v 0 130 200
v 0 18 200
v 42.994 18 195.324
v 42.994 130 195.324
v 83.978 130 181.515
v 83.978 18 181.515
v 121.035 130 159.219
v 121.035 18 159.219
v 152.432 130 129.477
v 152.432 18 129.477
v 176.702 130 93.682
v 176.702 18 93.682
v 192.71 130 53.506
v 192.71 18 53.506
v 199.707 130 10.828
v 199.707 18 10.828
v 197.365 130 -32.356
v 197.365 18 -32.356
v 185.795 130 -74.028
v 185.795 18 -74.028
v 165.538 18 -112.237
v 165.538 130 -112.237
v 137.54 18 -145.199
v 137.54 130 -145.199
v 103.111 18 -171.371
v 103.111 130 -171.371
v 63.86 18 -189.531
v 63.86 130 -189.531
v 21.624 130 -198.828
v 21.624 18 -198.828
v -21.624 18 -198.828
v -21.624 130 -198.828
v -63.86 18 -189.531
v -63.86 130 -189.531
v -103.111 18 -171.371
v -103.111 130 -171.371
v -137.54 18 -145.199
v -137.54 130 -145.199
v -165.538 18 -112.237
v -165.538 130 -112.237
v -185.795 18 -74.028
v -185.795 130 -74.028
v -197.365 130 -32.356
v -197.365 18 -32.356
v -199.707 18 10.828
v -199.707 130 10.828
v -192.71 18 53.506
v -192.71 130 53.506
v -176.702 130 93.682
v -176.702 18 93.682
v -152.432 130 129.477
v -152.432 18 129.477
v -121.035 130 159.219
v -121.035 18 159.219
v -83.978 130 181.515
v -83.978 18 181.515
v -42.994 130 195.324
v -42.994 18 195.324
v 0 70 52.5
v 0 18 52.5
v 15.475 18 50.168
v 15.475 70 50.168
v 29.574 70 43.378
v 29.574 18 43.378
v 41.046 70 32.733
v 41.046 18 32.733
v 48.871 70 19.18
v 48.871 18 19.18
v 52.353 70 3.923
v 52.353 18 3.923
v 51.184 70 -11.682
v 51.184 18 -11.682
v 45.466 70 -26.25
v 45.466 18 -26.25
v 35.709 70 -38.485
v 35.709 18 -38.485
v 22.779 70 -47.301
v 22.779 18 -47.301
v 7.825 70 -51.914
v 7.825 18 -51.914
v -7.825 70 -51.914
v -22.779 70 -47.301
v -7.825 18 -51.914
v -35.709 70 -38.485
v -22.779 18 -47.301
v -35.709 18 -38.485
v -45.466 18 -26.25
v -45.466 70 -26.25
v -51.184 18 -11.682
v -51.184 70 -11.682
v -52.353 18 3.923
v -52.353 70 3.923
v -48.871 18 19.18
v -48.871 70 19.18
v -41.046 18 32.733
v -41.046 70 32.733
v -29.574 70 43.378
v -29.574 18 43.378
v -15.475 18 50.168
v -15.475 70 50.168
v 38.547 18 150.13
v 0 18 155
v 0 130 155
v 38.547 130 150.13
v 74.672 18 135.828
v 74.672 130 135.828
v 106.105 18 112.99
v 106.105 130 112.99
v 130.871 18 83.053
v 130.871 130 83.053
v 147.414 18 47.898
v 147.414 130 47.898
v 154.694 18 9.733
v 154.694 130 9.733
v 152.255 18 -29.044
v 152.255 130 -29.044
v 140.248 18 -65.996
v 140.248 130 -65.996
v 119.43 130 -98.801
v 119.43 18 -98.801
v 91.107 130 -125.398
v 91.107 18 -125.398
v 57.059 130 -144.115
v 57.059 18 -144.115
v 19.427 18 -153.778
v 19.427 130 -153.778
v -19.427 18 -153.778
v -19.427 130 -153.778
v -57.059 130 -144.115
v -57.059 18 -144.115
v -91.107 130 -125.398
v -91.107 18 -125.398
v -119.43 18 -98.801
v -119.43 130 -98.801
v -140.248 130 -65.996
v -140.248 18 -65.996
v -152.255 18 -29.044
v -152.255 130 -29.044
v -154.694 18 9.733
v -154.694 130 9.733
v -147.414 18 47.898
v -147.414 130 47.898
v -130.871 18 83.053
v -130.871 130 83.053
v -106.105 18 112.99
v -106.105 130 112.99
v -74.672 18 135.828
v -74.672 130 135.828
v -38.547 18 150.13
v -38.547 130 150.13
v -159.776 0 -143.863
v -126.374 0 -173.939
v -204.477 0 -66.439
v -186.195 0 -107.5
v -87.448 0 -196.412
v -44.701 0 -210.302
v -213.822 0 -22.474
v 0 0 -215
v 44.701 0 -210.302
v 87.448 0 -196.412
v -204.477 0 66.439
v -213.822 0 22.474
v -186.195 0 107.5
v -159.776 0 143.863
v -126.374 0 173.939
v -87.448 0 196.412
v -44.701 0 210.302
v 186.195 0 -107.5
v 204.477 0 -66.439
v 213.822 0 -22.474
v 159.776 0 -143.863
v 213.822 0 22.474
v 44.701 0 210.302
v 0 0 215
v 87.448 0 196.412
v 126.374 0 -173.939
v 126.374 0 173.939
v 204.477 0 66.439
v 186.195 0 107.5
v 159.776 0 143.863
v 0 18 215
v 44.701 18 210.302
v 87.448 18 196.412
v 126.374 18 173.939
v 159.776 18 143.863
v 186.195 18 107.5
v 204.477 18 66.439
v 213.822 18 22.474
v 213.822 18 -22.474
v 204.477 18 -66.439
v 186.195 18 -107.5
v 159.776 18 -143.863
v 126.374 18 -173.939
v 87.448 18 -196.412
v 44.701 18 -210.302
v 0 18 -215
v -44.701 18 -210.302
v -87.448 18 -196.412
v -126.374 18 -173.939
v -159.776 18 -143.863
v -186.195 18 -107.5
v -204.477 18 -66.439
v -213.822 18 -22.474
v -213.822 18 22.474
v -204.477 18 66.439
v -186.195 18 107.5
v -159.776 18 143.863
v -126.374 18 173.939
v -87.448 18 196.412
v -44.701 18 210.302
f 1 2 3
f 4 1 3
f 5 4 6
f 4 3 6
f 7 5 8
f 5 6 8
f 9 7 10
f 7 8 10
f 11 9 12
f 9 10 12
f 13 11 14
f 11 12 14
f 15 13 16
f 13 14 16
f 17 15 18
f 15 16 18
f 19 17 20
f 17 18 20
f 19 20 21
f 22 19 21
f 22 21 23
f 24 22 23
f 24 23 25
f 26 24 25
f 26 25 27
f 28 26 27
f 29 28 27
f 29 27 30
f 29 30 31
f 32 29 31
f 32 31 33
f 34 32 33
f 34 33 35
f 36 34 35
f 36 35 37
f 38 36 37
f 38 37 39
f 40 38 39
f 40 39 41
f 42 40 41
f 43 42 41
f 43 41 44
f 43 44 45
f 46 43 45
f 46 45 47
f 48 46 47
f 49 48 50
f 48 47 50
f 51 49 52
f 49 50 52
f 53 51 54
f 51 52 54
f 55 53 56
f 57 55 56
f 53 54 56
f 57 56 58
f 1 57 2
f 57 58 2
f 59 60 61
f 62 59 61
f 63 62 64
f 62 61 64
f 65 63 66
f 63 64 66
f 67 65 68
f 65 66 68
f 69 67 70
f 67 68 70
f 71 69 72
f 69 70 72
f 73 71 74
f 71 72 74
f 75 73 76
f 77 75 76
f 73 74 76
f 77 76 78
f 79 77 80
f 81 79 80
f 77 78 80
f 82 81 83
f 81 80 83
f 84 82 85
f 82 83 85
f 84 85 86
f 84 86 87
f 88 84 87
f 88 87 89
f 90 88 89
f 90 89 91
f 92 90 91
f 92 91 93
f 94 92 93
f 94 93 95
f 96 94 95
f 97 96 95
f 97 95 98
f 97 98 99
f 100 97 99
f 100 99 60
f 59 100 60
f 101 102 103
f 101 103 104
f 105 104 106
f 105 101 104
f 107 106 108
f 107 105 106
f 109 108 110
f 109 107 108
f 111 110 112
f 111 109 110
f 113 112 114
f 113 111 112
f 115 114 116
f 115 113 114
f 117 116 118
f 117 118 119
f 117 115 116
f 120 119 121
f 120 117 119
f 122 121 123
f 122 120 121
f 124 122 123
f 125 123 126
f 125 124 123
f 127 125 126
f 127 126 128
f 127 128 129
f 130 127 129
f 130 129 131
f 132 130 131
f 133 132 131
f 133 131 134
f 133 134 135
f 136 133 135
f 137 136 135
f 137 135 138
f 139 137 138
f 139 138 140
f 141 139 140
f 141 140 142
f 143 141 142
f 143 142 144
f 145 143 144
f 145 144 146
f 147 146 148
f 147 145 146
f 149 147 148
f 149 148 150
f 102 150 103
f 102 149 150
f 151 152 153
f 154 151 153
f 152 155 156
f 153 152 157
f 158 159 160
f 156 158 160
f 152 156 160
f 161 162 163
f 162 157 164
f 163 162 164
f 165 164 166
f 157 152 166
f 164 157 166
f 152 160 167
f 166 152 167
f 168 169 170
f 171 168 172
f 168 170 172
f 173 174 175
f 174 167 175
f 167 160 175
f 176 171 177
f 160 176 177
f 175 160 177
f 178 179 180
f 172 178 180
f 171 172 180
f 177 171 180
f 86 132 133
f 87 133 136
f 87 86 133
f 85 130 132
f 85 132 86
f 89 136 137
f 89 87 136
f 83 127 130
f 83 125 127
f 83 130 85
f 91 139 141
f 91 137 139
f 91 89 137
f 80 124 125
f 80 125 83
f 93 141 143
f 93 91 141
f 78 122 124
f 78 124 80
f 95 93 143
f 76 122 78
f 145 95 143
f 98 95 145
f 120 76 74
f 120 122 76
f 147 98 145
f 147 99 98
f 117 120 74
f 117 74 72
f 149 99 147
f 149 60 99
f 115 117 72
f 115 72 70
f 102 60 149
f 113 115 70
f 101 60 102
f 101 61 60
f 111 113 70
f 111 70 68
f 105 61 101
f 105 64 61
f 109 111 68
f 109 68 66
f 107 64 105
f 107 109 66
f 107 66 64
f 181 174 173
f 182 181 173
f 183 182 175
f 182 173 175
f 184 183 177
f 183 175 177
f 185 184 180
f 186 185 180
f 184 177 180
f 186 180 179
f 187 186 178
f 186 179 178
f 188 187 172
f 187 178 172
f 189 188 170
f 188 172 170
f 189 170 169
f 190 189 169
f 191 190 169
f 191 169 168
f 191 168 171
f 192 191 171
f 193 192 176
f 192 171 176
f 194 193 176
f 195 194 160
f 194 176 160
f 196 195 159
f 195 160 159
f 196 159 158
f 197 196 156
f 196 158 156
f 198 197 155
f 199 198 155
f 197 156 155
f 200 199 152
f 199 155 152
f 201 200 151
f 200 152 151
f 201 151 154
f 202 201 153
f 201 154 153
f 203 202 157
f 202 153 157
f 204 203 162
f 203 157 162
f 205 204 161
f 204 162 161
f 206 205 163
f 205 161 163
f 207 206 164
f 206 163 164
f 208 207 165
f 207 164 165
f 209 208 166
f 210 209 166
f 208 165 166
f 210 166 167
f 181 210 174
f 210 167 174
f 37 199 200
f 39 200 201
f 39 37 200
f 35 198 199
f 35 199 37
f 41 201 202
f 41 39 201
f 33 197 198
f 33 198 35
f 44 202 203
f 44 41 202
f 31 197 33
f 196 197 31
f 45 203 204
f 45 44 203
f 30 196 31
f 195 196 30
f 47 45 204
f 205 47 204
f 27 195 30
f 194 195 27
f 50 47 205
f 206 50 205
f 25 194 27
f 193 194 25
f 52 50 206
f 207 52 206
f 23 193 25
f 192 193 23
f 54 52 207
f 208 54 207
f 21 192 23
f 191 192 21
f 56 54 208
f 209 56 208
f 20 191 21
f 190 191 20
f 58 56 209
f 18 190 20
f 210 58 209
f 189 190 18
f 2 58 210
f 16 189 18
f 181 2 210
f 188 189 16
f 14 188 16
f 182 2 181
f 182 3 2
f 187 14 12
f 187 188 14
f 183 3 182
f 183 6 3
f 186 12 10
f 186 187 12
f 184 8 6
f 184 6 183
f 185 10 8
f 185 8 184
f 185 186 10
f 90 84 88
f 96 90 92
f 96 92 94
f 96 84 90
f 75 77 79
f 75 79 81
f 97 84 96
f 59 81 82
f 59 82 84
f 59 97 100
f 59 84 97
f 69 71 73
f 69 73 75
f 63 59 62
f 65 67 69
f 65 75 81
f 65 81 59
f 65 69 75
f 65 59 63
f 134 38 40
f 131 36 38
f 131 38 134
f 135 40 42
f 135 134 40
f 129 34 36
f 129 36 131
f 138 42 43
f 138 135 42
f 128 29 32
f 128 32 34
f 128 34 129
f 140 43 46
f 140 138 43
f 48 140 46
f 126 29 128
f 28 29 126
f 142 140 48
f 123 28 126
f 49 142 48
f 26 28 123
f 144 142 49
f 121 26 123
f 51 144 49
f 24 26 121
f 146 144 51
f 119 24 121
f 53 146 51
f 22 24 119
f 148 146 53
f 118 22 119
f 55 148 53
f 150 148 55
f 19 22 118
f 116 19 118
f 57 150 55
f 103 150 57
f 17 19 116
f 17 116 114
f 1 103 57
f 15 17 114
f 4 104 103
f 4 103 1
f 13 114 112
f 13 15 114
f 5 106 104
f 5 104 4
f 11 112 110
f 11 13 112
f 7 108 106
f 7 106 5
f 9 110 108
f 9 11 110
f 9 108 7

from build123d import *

# Parameters (mm, degrees)
F_01_BOWL_FLANGE_PROFILE_R   = 215
F_01_BOWL_FLANGE_PROFILE_R_2 = 6
F_01_BOWL_BASE_FLANGE_DEPTH  = 18
F_02_BOWL_WALL_PROFILE_R     = 200
F_02_BOWL_WALL_PROFILE_R_2   = 155
F_02_BOWL_WALL_DEPTH         = 130
F_03_CENTER_CONE_BASE_R      = 52.5
F_03_CENTER_GUIDE_BOSS_DEPTH = 70


with BuildPart() as part:
    # 01_Bowl_Flange_Profile → 01_Bowl_Base_Flange (new body)
    with BuildSketch(Plane(origin=(0, 0, 0), x_dir=(1, 0, 0), z_dir=(0, 1, 0))):
        with Locations(Location((0, 0, 0), (0, 0, 270))):
            Circle(F_01_BOWL_FLANGE_PROFILE_R)
        with Locations(Location((170.917713515, 70.796434988, 0), (0, 0, 270))):
            Circle(F_01_BOWL_FLANGE_PROFILE_R_2, mode=Mode.SUBTRACT)
        with Locations(Location((70.796434988, 170.917713515, 0), (0, 0, 270))):
            Circle(F_01_BOWL_FLANGE_PROFILE_R_2, mode=Mode.SUBTRACT)
        with Locations(Location((-70.796434988, 170.917713515, 0), (0, 0, 270))):
            Circle(F_01_BOWL_FLANGE_PROFILE_R_2, mode=Mode.SUBTRACT)
        with Locations(Location((-170.917713515, 70.796434988, 0), (0, 0, 270))):
            Circle(F_01_BOWL_FLANGE_PROFILE_R_2, mode=Mode.SUBTRACT)
        with Locations(Location((-170.917713515, -70.796434988, 0), (0, 0, 270))):
            Circle(F_01_BOWL_FLANGE_PROFILE_R_2, mode=Mode.SUBTRACT)
        with Locations(Location((-70.796434988, -170.917713515, 0), (0, 0, 270))):
            Circle(F_01_BOWL_FLANGE_PROFILE_R_2, mode=Mode.SUBTRACT)
        with Locations(Location((70.796434988, -170.917713515, 0), (0, 0, 270))):
            Circle(F_01_BOWL_FLANGE_PROFILE_R_2, mode=Mode.SUBTRACT)
        with Locations(Location((170.917713515, -70.796434988, 0), (0, 0, 270))):
            Circle(F_01_BOWL_FLANGE_PROFILE_R_2, mode=Mode.SUBTRACT)
    extrude(amount=F_01_BOWL_BASE_FLANGE_DEPTH)

    # 02_Bowl_Wall_Profile → 02_Bowl_Wall (add)
    with BuildSketch(Plane(origin=(0, 0, 0), x_dir=(1, 0, 0), z_dir=(0, 1, 0))):
        with Locations(Location((0, 0, 0), (0, 0, 270))):
            Circle(F_02_BOWL_WALL_PROFILE_R)
        with Locations(Location((0, 0, 0), (0, 0, 270))):
            Circle(F_02_BOWL_WALL_PROFILE_R_2, mode=Mode.SUBTRACT)
    extrude(amount=F_02_BOWL_WALL_DEPTH)

    # 03_Center_Cone_Base → 03_Center_Guide_Boss (add)
    with BuildSketch(Plane(origin=(0, 0, 0), x_dir=(1, 0, 0), z_dir=(0, 1, 0))):
        with Locations(Location((0, 0, 0), (0, 0, 270))):
            Circle(F_03_CENTER_CONE_BASE_R)
    extrude(amount=F_03_CENTER_GUIDE_BOSS_DEPTH)


solid = part.part
